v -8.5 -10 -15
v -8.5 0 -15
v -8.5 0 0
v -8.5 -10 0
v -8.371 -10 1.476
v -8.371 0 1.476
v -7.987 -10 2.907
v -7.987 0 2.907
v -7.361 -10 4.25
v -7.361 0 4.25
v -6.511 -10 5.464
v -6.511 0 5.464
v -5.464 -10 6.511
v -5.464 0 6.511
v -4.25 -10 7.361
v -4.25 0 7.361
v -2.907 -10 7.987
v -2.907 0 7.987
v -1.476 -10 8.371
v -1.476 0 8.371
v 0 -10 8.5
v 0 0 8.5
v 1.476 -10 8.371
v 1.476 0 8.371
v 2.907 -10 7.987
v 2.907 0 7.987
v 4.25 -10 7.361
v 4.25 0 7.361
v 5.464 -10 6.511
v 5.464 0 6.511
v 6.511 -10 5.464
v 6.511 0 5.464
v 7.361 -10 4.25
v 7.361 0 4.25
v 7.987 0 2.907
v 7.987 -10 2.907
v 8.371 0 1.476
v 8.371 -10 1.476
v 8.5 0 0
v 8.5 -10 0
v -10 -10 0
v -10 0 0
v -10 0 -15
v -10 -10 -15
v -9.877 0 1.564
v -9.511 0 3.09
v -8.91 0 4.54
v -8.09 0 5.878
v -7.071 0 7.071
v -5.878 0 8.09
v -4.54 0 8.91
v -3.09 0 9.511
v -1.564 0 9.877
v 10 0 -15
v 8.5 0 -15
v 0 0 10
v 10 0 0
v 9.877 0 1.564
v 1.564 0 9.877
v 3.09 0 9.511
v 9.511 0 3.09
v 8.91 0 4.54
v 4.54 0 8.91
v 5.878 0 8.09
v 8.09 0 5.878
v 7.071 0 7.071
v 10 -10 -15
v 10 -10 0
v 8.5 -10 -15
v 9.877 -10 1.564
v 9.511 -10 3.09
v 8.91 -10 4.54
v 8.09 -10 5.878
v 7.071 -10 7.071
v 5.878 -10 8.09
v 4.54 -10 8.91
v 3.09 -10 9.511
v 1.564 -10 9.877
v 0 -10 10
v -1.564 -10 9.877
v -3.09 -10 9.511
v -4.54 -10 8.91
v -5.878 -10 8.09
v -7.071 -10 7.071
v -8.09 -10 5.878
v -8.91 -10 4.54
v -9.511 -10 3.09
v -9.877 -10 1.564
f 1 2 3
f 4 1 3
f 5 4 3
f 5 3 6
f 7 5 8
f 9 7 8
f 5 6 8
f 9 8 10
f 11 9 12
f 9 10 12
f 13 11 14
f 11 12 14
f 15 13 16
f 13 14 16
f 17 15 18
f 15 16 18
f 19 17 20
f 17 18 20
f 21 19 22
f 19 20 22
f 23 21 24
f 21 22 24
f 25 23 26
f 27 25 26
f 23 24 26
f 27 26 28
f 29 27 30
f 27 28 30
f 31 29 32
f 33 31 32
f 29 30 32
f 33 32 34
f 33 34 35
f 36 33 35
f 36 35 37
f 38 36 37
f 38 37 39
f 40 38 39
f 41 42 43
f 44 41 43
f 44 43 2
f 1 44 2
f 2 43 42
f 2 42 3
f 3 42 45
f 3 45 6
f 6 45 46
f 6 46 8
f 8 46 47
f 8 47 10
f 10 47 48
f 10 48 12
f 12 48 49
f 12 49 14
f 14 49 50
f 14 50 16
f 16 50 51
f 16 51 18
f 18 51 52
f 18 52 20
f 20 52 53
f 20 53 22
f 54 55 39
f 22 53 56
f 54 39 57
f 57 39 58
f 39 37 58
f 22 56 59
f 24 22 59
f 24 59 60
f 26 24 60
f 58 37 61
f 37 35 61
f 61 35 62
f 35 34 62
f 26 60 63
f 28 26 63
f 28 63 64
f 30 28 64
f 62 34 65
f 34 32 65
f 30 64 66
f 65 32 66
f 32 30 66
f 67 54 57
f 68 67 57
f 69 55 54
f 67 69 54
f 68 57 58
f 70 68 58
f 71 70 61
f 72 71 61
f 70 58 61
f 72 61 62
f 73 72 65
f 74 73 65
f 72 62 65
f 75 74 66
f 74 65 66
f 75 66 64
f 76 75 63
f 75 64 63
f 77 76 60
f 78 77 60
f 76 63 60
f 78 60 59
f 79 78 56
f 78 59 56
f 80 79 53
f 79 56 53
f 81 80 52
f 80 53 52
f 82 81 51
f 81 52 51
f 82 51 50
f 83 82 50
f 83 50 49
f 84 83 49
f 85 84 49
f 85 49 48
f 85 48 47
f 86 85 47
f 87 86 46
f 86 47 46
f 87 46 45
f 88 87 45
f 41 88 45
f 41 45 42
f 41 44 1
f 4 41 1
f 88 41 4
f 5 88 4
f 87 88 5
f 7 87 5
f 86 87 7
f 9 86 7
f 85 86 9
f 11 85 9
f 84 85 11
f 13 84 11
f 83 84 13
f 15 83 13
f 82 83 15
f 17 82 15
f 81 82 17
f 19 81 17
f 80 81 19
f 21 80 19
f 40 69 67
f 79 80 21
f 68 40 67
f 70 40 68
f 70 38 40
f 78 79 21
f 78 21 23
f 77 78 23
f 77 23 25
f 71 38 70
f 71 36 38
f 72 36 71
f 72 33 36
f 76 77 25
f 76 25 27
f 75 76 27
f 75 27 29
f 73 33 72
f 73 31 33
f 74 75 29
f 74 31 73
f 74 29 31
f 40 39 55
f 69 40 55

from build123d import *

# Parameters (mm, degrees)
F0_W     = 1.5
F0_H     = 5
F1_DEPTH = 10


with BuildPart() as f1:
    # F0 (on Front) → F1 (new body)
    with BuildSketch(Plane.XZ):
        with BuildLine():
            Line((10, -10), (10, 0))
            ThreePointArc((10, 0), (0, 10), (-10, 0))
            Line((-10, 0), (-10, -10))
            Line((-10, -10), (-8.5, -10))
            Line((-8.5, -10), (-8.5, 0))
            ThreePointArc((-8.5, 0), (0, 8.5), (8.5, 0))
            Line((8.5, 0), (8.5, -10))
            Line((8.5, -10), (10, -10))
        make_face()
        with Locations((9.25, -12.5)):
            Rectangle(F0_W, F0_H)
        with Locations((-9.25, -12.5)):
            Rectangle(F0_W, F0_H)
    extrude(amount=F1_DEPTH)


solid = f1.part
